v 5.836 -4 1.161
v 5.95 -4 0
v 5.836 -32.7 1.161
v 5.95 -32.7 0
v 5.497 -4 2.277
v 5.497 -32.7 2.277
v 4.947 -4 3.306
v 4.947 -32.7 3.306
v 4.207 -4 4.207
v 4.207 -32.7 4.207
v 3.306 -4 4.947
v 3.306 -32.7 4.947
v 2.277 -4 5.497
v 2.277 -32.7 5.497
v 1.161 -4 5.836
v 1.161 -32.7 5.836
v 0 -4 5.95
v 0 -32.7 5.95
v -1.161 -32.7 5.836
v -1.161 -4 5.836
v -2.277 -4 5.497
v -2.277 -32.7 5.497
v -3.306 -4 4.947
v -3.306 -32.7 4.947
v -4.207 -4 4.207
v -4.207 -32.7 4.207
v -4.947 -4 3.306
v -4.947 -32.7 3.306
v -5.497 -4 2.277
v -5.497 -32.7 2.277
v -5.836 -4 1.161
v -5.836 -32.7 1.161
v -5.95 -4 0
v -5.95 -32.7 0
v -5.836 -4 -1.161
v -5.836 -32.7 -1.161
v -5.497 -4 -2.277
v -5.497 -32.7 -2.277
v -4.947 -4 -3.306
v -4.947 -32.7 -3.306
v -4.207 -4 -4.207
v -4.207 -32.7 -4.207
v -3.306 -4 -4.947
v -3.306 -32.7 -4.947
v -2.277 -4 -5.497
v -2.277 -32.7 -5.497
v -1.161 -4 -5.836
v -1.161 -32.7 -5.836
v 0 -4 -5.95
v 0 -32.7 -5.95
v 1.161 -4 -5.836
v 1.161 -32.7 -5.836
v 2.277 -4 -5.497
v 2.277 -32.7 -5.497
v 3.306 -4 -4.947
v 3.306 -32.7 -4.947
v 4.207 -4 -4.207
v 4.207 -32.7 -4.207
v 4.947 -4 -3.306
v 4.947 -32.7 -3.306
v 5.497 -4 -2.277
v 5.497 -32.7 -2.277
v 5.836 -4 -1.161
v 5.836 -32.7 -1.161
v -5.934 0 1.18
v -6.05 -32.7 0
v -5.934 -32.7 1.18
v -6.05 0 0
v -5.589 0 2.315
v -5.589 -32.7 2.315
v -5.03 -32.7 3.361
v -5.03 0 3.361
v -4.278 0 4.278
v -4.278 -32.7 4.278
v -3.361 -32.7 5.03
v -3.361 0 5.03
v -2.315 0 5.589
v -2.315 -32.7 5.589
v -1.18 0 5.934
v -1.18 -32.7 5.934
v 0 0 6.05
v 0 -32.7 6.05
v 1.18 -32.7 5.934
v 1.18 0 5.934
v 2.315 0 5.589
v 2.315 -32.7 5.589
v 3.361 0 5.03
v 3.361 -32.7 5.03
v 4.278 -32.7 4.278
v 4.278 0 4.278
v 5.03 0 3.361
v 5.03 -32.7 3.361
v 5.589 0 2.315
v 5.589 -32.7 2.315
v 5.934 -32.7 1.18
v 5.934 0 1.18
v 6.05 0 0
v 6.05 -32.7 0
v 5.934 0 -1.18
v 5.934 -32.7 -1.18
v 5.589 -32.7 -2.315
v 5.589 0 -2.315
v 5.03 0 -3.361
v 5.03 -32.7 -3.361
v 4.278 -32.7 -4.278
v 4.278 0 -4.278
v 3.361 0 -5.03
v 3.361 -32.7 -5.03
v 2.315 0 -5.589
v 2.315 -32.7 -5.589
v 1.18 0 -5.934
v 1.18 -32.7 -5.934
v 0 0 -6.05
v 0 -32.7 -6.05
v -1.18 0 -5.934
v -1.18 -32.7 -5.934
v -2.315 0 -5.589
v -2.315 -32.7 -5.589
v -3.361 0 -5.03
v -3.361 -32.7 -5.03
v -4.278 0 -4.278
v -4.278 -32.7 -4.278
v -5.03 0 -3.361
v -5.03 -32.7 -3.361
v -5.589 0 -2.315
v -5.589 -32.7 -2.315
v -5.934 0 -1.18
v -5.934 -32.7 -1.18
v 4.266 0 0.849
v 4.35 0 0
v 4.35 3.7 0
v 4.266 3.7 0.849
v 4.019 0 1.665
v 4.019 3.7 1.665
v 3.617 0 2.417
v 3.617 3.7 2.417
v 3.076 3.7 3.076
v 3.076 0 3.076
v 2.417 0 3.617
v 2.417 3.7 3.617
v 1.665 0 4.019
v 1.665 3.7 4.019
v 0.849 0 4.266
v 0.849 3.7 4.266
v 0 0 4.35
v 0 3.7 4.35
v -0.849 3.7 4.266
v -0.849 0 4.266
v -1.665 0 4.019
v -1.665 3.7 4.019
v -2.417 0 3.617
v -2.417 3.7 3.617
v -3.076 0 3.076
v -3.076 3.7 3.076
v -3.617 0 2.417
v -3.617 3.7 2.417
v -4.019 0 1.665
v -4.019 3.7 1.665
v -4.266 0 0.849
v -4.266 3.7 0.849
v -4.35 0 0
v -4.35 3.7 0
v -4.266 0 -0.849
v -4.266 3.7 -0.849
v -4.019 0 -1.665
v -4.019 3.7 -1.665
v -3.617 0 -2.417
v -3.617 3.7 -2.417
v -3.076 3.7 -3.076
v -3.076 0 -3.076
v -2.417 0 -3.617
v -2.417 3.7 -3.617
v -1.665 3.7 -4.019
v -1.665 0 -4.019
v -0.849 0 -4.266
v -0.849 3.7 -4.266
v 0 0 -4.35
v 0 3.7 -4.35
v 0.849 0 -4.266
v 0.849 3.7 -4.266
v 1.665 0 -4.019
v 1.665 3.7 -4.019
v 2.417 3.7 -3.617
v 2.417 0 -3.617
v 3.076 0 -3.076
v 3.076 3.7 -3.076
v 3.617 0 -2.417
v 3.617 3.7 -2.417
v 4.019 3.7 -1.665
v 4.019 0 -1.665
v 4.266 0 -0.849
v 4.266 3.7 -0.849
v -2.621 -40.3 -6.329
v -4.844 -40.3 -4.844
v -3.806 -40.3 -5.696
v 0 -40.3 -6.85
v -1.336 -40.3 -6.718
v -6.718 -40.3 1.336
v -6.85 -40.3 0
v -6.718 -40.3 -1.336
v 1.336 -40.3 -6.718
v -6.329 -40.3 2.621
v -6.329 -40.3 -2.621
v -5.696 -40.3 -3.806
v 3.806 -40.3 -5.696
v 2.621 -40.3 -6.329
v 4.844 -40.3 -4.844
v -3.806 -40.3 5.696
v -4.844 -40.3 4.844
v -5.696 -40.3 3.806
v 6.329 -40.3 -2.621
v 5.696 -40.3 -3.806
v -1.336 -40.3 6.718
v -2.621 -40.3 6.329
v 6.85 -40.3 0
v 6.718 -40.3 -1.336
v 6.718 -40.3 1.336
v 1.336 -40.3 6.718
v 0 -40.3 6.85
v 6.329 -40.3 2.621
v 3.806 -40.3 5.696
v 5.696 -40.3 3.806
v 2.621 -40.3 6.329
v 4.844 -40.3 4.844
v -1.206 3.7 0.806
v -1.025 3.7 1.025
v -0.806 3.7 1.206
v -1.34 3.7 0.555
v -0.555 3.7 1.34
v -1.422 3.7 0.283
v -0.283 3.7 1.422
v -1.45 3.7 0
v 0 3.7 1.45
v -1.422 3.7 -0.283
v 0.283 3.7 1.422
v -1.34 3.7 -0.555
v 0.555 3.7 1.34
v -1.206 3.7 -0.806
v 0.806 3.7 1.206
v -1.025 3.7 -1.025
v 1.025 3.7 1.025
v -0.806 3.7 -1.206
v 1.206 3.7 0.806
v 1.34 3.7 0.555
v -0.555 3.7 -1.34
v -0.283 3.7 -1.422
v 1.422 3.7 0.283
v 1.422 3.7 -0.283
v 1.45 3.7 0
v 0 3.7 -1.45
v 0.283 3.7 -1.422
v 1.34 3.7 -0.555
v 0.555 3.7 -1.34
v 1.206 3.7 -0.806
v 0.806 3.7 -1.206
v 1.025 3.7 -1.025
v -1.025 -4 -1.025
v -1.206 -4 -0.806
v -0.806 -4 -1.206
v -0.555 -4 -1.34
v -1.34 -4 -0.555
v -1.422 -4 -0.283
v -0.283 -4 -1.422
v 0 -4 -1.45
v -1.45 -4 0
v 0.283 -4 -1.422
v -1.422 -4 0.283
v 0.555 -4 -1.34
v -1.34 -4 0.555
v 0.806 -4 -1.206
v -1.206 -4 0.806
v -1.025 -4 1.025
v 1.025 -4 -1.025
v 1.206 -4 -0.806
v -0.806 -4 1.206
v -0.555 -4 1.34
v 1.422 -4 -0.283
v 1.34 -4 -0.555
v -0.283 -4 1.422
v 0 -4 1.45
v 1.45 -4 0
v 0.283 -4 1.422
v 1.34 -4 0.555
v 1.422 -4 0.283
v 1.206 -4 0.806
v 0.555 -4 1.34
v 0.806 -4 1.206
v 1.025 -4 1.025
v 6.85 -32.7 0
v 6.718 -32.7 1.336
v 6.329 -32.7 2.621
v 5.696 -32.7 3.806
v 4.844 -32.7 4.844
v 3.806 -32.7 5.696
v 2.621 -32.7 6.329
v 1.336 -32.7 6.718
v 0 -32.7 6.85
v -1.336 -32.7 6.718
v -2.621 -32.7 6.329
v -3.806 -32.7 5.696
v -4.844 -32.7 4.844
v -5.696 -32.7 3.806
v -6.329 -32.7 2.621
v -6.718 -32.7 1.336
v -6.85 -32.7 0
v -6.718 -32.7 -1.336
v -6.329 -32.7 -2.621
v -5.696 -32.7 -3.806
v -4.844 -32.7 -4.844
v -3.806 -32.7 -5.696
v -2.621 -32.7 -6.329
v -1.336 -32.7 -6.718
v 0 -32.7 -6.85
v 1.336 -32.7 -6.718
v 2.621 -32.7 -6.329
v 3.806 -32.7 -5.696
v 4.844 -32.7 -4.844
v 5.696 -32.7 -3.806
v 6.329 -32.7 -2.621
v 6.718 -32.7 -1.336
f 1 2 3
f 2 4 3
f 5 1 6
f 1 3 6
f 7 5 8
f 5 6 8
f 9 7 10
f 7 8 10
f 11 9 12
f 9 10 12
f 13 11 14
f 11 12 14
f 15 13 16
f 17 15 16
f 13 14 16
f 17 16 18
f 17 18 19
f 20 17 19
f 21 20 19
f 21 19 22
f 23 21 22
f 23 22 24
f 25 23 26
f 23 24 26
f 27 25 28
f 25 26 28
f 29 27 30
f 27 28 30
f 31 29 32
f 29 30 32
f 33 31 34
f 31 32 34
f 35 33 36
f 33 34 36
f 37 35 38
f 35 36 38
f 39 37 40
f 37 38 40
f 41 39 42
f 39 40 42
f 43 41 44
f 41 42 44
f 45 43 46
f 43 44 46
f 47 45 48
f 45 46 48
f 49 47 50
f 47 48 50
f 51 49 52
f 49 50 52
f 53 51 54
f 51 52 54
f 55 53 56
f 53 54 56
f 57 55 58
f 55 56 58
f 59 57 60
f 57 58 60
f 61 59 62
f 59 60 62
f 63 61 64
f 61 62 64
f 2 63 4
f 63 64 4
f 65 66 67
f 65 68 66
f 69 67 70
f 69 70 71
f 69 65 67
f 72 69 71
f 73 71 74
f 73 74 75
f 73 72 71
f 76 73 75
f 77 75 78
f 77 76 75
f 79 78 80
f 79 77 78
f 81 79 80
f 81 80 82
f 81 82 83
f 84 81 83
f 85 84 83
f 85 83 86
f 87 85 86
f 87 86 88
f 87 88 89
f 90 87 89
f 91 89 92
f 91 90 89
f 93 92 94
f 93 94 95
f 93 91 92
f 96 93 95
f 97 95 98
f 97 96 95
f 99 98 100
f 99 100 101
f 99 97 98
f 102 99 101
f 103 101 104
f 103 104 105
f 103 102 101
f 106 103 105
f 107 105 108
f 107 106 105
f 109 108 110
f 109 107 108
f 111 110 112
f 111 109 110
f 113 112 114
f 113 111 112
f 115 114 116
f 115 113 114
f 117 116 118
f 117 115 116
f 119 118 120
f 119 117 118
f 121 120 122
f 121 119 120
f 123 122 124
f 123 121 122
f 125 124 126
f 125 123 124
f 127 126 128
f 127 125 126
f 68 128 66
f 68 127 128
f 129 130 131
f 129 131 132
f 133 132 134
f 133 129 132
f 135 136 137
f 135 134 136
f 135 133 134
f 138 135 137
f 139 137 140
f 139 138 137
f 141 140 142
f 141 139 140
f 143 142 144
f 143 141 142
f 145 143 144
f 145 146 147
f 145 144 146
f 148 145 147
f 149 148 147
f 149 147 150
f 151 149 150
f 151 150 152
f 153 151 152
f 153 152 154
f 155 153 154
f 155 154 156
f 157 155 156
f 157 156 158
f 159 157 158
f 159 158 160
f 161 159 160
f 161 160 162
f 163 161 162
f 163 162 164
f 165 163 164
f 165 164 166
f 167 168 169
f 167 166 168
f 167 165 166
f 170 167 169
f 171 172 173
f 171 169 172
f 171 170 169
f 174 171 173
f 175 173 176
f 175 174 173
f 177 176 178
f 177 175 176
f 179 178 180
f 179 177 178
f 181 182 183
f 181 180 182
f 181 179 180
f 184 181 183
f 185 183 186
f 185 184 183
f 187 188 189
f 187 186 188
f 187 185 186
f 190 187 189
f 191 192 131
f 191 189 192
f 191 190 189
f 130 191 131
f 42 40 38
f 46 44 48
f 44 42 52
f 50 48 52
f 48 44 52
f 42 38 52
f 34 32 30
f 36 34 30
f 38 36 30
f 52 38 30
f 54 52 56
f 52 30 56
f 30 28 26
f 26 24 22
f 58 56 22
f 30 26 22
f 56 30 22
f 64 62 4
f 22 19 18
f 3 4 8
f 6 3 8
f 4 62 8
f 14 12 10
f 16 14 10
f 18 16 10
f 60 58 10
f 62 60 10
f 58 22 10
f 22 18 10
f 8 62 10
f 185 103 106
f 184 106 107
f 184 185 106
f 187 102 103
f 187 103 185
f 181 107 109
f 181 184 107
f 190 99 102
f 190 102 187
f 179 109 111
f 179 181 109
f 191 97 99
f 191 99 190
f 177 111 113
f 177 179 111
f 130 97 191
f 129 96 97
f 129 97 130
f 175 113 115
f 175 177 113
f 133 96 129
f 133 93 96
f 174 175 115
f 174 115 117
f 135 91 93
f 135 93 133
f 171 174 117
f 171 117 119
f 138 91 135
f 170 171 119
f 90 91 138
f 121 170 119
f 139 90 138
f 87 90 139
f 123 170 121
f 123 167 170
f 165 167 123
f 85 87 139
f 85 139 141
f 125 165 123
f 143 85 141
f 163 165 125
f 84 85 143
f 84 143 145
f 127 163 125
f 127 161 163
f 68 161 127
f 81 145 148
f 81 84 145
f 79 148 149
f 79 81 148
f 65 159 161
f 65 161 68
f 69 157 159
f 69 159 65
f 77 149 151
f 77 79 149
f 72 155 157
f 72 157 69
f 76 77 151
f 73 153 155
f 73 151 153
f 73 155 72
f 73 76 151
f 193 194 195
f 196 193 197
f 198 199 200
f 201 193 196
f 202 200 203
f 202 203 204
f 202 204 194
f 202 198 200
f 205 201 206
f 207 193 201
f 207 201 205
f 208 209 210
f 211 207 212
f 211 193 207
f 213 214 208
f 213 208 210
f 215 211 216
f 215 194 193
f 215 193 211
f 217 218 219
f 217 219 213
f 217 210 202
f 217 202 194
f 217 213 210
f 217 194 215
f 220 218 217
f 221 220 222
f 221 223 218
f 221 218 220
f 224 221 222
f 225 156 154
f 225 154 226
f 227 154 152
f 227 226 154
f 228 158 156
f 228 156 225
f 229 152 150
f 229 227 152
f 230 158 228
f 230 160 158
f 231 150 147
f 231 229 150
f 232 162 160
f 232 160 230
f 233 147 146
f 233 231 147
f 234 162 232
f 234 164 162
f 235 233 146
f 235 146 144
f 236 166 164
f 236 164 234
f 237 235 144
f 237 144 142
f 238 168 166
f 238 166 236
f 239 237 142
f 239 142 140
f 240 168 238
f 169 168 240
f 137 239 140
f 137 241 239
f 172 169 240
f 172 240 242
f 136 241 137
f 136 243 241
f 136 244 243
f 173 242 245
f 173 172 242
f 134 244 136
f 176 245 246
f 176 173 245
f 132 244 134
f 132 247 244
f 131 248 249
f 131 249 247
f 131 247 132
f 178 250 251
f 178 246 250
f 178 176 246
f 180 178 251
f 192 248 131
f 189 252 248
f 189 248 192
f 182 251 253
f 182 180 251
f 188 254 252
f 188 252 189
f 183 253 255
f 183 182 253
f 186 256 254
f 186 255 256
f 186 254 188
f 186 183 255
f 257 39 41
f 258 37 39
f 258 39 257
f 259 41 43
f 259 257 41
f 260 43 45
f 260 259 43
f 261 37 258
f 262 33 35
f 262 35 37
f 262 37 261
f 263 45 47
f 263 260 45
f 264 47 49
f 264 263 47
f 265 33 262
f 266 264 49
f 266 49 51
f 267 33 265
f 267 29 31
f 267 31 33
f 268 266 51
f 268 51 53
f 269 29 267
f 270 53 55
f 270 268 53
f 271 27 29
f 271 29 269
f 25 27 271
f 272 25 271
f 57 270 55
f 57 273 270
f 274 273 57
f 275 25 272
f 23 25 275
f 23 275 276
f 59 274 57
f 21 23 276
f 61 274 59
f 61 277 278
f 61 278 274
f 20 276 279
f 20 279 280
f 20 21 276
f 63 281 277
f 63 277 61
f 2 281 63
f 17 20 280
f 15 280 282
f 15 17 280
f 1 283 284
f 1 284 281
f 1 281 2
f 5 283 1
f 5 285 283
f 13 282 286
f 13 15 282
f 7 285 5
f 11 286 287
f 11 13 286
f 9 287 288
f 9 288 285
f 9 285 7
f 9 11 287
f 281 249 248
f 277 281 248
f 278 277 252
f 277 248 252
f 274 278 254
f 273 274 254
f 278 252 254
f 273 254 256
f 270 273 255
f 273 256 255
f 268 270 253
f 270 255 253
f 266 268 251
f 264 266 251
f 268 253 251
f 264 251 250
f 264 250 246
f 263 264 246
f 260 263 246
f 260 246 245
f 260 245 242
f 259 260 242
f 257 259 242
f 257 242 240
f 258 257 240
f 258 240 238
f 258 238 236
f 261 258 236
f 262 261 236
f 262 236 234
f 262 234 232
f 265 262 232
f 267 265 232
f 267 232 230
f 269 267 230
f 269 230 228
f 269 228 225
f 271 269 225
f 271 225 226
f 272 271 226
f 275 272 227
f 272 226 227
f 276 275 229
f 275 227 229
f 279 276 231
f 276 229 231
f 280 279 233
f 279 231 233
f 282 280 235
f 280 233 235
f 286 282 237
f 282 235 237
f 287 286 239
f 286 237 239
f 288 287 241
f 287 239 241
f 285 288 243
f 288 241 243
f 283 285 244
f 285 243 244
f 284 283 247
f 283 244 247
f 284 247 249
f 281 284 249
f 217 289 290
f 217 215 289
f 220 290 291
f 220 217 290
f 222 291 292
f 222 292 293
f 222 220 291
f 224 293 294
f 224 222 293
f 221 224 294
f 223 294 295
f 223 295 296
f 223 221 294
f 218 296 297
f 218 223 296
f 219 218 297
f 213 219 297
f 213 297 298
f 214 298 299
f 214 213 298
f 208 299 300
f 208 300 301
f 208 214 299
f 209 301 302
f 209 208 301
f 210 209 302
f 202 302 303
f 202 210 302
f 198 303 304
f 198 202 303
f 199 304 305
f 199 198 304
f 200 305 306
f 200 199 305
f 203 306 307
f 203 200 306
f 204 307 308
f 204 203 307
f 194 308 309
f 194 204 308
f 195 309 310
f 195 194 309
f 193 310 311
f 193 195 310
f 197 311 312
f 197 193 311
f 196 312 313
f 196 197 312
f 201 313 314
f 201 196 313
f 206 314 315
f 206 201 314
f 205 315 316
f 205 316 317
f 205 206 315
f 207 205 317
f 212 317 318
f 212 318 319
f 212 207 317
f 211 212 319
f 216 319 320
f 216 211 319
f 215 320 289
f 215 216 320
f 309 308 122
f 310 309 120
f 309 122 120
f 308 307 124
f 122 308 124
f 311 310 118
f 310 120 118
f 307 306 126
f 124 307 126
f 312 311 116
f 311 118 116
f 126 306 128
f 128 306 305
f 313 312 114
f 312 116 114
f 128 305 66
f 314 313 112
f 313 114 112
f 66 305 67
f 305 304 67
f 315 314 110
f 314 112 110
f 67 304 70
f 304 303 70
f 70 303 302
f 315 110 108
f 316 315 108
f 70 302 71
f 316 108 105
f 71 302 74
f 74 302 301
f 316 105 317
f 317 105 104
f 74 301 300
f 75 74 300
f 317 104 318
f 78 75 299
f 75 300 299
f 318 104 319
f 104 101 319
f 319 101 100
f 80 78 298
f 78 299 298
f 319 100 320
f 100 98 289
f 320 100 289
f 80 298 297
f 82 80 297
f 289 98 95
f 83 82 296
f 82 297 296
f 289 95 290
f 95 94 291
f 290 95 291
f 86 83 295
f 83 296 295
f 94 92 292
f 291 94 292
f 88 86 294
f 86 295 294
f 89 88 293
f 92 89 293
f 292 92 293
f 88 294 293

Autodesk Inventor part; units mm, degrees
ref_plane "YZ Plane" through (0, 0, 0) normal (1, 0, 0) x (0, 1, 0)
ref_plane "XZ Plane" through (0, 0, 0) normal (0, 1, 0) x (-1, 0, 0)
ref_plane "XY Plane" through (0, 0, 0) normal (0, 0, 1) x (1, 0, 0)
sketch "Boceto1" plane through (0, 0, 0) normal (0, 1, 0) x (-1, 0, 0)
  circle A0 centre (0, 0) radius 6.05
  dimension "d0" = 12.1
extrude "Extrusión1" add sketch "Boceto1" against normal blind 32.7
sketch "Boceto2" plane through (0, 0, 0) normal (0, 1, 0) x (1, 0, 0)
  circle A0 centre (0, 0) radius 4.35
  dimension "d3" = 8.7
extrude "Extrusión2" add sketch "Boceto2" along normal blind 3.7
thread "Rosca1" size "M9x1.25" class "6g" standard "ANSI Metric M Profile" full length
sketch "Boceto3" plane through (0, -32.7, 0) normal (0, -1, 0) x (1, 0, 0)
  circle A0 centre (0, 0) radius 6.9
  dimension "d8" = 13.8
sketch "Boceto4" plane through (0, -32.7, 0) normal (0, -1, 0) x (1, 0, 0)
  circle A0 centre (0, 0) radius 5.95
  dimension "d9" = 11.9
extrude "Extrusión3" cut sketch "Boceto4" against normal blind 28.7
sketch "Boceto5" plane through (0, -32.7, 0) normal (0, -1, 0) x (1, 0, 0)
  point P0 (0, 0)
extrude "Extrusión4" add sketch "Boceto3" along normal blind 7.6
sketch "Boceto6" plane through (0, 3.7, 0) normal (0, 1, 0) x (1, 0, 0)
  circle A0 centre (0, 0) radius 1.45
  dimension "d14" = 2.9
extrude "Extrusión5" cut sketch "Boceto6" against normal blind 20
sketch "Boceto7" plane through (0, -40.3, 0) normal (0, -1, 0) x (1, 0, 0)
  circle A0 centre (0, 0) radius 6.85
  circle A1 centre (0, 0) radius 6.9
  dimension "d17" = 13.7
  dimension "d18" = 13.8
extrude "Extrusión6" cut sketch "Boceto7" against normal blind 20
properties part number "Piston(Deposito_deAceite)" material "Plástico ABS"
